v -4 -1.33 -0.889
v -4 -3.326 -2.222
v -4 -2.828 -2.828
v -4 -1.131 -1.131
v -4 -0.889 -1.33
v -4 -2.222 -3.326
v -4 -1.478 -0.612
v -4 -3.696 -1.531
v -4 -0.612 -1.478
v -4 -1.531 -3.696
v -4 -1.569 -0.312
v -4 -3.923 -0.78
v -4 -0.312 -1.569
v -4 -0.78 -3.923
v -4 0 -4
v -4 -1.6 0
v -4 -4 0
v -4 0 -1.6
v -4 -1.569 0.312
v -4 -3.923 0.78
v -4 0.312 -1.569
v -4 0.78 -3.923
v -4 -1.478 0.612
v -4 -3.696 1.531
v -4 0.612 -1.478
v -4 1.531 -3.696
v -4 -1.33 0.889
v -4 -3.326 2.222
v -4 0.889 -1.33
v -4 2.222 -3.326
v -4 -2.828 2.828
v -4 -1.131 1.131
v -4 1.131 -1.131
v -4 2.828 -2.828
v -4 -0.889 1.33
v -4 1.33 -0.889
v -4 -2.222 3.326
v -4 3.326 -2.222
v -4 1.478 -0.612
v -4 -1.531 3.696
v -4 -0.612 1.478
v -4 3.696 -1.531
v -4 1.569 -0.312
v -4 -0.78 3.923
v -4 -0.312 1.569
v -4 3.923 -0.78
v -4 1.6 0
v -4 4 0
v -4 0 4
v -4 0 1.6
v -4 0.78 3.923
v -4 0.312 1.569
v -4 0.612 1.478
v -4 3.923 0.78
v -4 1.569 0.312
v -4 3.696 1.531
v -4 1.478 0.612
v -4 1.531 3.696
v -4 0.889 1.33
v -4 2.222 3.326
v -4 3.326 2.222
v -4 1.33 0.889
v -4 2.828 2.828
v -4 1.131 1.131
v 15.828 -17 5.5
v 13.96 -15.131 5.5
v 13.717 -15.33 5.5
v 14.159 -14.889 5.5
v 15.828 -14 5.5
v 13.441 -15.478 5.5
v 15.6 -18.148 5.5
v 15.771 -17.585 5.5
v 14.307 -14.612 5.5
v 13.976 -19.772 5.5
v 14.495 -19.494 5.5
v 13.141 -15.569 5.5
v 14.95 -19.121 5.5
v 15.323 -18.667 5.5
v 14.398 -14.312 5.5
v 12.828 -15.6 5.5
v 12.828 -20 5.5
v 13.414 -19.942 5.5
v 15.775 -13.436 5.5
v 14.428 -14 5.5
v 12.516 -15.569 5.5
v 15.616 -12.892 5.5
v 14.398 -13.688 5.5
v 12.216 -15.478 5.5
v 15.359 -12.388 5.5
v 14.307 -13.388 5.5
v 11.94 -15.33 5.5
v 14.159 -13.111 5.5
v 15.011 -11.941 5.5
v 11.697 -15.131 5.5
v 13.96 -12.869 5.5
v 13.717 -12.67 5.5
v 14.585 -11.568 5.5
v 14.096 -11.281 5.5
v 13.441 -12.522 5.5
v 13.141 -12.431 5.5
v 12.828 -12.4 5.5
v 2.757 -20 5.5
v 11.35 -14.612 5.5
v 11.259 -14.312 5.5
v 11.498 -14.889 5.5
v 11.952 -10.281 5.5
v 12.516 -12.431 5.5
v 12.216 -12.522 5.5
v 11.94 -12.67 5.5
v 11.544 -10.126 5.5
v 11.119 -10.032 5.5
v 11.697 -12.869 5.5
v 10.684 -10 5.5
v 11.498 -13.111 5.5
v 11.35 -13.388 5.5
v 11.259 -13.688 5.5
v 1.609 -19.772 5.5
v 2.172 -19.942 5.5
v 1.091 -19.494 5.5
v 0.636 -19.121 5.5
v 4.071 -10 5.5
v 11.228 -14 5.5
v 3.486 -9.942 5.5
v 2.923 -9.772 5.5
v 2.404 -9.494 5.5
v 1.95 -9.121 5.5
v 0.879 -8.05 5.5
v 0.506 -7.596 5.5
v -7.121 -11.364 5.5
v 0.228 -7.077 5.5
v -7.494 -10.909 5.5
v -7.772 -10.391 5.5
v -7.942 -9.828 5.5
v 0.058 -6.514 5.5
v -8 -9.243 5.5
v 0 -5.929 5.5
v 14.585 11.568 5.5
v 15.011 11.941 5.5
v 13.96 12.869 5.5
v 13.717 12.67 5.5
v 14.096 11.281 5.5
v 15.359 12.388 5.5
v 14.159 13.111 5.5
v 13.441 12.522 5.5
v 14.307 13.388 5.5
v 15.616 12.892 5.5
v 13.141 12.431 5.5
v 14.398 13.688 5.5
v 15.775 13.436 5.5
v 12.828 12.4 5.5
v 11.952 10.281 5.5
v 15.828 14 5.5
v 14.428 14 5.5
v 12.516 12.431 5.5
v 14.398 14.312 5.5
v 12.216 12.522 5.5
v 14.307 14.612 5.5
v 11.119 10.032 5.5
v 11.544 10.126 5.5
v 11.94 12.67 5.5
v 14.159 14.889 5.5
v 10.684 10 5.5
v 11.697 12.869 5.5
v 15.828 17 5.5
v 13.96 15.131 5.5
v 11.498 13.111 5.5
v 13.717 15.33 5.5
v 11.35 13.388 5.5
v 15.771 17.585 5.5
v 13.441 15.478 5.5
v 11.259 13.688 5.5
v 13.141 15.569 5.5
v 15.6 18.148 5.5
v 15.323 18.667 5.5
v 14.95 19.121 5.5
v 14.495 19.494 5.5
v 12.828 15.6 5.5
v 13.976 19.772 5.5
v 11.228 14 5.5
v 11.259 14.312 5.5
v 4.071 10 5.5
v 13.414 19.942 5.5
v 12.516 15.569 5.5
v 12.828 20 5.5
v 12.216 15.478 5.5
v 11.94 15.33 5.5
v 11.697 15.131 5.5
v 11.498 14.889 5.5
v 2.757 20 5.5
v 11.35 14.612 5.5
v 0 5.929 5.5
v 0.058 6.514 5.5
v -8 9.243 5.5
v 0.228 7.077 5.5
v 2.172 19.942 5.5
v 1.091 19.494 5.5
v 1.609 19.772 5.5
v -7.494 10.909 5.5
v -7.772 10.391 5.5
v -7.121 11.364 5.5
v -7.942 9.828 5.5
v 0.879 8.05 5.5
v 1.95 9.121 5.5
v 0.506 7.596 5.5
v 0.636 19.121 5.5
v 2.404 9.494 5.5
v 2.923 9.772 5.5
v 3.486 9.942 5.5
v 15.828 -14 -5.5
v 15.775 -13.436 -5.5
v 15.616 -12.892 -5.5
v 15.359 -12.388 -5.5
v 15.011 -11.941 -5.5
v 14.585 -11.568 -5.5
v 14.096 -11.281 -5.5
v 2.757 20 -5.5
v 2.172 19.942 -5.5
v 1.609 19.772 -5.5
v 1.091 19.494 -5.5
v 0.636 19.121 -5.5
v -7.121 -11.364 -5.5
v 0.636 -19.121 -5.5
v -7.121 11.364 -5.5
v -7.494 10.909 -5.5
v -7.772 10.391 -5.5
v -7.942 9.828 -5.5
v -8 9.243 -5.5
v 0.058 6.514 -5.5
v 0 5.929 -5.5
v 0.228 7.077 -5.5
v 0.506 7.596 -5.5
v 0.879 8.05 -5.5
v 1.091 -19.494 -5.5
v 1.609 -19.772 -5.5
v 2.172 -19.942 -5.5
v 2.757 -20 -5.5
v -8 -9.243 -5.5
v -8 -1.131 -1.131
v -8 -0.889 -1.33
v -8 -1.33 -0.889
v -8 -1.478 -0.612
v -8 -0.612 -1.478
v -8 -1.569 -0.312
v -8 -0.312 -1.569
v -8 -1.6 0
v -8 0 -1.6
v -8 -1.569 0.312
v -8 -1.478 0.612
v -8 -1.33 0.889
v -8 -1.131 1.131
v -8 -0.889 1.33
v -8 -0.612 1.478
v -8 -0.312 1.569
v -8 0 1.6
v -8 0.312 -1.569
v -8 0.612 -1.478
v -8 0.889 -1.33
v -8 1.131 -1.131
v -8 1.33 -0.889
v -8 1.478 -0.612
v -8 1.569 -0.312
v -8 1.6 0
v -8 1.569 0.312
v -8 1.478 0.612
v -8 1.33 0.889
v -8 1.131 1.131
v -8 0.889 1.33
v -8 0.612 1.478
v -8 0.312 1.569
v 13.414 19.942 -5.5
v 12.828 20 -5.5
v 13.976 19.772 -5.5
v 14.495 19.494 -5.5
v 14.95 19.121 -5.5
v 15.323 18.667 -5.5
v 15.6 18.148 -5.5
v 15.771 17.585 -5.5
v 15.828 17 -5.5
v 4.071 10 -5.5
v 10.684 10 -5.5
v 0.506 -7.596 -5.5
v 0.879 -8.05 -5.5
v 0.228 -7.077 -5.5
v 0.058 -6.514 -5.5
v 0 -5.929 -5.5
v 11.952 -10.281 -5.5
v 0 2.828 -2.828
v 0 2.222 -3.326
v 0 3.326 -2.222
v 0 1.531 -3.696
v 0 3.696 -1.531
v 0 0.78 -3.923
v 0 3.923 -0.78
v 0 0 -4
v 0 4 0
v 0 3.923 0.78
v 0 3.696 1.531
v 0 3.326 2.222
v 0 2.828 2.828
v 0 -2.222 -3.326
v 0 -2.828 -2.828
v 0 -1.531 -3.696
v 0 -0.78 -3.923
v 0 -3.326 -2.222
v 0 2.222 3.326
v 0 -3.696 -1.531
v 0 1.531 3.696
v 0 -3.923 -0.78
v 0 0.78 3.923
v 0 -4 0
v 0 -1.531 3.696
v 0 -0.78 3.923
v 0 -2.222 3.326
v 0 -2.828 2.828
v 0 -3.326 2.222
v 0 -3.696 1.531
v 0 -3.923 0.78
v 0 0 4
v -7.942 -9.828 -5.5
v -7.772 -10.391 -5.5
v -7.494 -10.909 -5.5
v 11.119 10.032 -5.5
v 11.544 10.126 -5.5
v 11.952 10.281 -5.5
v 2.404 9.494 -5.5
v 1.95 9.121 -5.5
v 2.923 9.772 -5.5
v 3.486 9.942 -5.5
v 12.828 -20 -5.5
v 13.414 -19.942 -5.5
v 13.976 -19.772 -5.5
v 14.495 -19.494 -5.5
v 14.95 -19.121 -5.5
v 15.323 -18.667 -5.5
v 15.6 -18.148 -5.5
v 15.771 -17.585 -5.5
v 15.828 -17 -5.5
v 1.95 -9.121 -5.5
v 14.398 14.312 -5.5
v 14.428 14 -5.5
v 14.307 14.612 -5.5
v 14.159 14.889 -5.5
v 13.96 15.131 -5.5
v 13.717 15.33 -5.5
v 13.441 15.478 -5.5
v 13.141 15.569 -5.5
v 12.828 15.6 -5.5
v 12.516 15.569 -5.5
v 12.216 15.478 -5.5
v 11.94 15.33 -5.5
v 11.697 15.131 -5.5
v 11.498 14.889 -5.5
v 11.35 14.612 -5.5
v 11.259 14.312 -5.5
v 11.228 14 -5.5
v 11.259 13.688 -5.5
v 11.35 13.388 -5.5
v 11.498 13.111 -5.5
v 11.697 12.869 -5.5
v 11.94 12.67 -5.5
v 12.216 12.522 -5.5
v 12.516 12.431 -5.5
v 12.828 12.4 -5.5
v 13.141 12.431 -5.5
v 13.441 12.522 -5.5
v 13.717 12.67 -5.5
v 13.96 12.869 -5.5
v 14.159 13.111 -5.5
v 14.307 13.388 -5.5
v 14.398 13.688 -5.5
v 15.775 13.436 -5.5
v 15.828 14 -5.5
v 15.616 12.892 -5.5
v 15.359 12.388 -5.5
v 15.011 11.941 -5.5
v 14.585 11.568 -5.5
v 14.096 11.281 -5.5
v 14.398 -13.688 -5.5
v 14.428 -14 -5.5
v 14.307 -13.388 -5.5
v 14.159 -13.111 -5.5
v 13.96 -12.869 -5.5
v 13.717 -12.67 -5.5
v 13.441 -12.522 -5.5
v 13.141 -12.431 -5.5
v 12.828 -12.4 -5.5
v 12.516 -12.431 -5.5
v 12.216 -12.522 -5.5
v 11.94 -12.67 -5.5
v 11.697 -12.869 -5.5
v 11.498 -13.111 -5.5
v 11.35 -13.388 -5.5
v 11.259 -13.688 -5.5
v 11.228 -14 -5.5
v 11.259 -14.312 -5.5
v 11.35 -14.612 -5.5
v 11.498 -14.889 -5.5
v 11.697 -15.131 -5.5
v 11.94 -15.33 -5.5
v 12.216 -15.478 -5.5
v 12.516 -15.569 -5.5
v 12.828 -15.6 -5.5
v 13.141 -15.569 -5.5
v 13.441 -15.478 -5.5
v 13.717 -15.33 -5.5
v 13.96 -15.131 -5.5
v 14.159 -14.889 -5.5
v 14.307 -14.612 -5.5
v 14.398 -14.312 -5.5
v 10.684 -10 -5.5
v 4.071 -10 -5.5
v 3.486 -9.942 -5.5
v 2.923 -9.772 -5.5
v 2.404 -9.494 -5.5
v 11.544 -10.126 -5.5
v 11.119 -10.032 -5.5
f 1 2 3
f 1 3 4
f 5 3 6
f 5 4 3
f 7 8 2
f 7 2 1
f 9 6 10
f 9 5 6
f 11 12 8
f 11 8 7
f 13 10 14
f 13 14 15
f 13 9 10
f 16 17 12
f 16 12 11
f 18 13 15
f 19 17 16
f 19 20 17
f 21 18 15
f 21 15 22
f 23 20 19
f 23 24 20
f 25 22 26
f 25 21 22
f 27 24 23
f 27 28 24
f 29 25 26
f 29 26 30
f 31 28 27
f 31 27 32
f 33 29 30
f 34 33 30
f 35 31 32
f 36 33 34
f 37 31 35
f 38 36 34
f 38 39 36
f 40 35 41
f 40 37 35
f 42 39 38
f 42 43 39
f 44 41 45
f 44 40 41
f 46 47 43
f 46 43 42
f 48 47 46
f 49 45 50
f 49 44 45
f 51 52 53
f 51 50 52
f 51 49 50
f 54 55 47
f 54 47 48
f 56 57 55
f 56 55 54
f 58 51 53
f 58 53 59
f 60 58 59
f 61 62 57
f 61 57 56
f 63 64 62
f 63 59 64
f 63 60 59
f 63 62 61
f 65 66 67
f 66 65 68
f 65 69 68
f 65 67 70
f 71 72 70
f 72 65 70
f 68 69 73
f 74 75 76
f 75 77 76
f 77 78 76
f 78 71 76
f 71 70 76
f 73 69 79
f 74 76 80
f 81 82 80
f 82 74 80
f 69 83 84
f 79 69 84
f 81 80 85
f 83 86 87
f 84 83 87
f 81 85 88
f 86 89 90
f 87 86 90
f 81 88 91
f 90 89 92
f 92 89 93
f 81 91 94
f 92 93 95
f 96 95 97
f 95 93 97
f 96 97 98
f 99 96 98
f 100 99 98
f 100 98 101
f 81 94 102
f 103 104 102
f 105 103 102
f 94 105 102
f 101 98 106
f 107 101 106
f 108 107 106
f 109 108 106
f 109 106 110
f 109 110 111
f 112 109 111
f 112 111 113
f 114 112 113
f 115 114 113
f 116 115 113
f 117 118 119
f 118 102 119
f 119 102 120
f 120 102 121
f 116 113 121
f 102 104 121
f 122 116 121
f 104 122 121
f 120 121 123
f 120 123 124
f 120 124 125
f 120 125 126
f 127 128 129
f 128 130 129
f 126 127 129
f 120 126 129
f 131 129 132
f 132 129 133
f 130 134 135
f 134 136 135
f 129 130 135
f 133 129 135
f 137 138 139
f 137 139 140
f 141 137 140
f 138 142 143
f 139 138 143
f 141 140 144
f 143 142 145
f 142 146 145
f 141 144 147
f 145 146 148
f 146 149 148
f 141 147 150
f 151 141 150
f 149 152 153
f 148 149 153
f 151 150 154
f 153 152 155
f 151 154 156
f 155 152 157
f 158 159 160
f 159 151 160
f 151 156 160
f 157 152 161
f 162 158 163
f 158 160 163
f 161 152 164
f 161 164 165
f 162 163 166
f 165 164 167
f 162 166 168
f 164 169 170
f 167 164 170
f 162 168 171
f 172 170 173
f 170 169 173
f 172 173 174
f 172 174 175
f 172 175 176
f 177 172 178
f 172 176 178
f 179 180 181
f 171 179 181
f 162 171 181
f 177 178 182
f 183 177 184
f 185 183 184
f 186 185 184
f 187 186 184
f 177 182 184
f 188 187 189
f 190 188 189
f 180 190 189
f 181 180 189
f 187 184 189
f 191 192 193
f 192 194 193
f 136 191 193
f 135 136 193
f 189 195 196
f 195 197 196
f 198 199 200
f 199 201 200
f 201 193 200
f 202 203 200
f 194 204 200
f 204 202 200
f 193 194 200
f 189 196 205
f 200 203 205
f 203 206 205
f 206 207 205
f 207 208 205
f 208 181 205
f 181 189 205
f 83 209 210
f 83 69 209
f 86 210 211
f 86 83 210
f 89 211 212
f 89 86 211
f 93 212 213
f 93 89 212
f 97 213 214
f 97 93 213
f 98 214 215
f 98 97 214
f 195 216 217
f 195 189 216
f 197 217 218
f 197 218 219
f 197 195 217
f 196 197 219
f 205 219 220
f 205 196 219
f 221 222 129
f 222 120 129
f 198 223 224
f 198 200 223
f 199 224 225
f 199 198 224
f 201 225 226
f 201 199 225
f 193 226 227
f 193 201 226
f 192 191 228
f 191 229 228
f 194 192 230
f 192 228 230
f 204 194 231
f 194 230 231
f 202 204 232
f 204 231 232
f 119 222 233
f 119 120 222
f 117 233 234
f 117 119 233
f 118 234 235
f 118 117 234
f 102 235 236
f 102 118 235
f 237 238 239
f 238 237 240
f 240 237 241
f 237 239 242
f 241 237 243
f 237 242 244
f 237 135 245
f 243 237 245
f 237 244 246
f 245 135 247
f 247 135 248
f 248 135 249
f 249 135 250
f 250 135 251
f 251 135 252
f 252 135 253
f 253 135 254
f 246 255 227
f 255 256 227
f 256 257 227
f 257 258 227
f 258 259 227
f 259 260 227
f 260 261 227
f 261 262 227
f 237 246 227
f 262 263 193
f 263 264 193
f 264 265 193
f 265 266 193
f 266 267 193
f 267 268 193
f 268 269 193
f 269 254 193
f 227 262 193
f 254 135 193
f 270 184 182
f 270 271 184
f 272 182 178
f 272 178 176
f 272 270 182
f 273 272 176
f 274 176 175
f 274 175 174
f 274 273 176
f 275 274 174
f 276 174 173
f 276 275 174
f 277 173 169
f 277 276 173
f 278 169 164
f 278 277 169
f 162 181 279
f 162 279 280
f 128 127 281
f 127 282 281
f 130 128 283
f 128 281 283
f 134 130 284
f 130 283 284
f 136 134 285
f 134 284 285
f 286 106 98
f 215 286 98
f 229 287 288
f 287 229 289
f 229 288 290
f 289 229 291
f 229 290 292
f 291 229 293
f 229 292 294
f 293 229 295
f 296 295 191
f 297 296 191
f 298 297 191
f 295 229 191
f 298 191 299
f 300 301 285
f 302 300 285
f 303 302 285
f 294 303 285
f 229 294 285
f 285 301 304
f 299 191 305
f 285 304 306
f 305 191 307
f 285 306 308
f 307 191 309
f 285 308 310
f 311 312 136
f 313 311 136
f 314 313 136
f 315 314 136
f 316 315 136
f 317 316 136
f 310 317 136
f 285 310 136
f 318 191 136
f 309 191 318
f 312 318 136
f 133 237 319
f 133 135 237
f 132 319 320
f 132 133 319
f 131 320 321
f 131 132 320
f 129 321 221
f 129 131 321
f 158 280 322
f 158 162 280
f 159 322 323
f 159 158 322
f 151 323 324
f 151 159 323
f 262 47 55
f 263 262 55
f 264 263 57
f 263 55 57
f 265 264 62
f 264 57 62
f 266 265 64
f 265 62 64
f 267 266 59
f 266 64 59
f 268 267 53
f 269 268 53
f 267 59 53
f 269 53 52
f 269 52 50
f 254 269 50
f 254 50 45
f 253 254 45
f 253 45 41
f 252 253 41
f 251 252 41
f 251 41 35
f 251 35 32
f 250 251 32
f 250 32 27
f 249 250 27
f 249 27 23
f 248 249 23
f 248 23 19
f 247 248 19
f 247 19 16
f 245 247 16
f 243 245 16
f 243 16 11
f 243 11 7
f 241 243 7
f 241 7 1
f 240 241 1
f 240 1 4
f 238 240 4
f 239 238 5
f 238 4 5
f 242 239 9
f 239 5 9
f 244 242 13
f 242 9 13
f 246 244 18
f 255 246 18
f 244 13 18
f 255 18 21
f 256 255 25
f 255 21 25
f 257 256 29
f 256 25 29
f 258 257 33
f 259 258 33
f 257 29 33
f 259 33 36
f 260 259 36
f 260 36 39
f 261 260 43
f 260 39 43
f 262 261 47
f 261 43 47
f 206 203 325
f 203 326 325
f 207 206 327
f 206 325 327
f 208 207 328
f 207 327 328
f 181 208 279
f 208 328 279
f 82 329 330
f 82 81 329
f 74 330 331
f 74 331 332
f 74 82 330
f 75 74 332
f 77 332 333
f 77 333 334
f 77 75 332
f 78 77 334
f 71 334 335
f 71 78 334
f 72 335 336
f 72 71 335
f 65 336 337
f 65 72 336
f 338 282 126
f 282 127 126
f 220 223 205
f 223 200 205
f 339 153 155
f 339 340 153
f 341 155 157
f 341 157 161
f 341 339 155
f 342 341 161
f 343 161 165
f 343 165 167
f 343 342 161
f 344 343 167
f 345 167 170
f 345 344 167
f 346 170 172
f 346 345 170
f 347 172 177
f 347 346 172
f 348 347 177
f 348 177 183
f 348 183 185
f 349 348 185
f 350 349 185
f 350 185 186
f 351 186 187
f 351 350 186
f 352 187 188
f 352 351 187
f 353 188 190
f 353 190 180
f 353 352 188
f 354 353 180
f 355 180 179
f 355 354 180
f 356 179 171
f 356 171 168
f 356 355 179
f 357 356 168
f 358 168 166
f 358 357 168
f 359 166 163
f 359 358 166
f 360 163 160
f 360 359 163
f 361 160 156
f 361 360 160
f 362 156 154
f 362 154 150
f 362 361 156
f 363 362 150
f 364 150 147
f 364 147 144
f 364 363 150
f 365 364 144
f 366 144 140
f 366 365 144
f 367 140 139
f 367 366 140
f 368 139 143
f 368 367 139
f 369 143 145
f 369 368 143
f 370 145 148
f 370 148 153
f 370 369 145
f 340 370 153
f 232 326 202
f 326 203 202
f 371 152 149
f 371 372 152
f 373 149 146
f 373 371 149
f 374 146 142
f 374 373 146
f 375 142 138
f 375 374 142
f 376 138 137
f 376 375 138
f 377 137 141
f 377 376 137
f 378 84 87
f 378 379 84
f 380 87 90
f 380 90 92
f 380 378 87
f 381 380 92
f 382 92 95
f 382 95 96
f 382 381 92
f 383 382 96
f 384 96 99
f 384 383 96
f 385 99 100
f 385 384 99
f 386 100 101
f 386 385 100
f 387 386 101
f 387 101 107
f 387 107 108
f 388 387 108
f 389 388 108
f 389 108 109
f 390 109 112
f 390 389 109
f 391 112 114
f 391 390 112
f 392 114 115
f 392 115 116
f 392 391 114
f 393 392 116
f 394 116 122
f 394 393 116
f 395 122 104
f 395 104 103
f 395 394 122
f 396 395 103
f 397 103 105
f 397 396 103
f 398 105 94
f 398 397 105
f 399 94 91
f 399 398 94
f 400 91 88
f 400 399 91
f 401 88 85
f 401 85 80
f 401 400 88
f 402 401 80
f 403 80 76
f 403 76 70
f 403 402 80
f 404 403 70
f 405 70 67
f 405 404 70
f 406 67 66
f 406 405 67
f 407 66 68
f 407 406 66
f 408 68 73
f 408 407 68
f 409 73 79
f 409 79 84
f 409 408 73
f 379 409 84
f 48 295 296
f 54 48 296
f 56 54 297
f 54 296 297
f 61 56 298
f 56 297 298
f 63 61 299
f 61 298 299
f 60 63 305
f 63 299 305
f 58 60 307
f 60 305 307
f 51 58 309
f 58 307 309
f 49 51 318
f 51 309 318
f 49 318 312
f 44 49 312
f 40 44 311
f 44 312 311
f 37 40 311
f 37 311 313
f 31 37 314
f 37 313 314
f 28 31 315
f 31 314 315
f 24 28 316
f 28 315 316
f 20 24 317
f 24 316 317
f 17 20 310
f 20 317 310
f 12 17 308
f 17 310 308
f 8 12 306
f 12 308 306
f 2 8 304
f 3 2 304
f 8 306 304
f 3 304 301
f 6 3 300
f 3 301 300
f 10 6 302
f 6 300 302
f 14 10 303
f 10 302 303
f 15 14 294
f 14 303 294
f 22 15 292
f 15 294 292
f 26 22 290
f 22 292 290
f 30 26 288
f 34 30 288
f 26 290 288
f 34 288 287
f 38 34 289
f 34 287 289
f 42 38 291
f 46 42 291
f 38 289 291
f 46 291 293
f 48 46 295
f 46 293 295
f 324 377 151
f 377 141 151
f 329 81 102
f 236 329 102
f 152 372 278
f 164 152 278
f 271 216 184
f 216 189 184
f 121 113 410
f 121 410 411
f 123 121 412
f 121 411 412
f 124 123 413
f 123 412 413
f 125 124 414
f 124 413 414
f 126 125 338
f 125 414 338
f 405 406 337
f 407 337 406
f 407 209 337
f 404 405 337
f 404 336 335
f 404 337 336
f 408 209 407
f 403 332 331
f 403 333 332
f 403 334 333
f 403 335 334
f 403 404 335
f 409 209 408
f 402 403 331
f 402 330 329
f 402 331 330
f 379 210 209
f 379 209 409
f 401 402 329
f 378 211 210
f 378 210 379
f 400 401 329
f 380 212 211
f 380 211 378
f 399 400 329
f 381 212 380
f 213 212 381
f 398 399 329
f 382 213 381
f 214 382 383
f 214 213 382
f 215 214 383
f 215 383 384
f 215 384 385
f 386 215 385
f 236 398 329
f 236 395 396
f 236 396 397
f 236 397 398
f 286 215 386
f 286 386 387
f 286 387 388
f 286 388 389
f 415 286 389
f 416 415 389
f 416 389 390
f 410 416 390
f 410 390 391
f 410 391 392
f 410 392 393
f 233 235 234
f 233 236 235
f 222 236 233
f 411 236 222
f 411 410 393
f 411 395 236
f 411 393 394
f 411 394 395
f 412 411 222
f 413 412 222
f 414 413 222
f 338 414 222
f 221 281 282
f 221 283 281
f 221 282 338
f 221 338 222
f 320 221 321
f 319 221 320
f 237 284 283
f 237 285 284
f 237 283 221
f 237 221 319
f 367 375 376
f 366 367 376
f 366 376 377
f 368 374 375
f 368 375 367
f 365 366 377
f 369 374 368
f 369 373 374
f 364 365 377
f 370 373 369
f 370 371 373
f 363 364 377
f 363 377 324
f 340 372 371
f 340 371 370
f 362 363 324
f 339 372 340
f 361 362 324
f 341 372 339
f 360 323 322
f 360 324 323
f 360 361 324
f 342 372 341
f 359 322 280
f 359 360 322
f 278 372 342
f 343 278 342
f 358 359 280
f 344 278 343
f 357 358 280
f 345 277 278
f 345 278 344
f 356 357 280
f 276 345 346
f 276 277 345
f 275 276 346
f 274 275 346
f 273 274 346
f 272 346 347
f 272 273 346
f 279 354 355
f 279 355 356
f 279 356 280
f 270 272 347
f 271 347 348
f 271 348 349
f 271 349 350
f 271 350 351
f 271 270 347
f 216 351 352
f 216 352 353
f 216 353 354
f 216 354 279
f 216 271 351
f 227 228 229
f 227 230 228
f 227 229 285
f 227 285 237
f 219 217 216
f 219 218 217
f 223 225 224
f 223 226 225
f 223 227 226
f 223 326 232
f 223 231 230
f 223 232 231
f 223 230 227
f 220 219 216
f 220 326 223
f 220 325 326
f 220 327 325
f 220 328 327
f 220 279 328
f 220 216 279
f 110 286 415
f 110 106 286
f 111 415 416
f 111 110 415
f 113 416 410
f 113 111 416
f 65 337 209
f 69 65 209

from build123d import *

# Parameters (mm, degrees)
SKETCH_R             = 1.6
PAD_DEPTH            = 5.5
SKETCH001_R          = 1.6
POCKET_DEPTH         = 8.001
POCKET001_DEPTH      = 5.501
POCKET001_DEPTH_BACK = 5.501
SKETCH003_W          = 10
SKETCH003_H          = 45
POCKET002_DEPTH      = 5.501
POCKET002_DEPTH_BACK = 5.501
SKETCH004_R          = 4
POCKET003_DEPTH      = 4
FILLET_R             = 3


with BuildPart() as part:
    # Sketch → Pad (new body, symmetric)
    with BuildSketch(Plane.XY):
        Polygon((1.514719, 20), (18.828427, 20), (18.828427, 10), (6.828427, 10), (2.828427, 10), (0, 7.171573), (0, -7.171573), (2.828427, -10), (6.828427, -10), (18.828427, -10), (18.828427, -20), (1.514719, -20), (-8, -10.485281), (-8, 10.485281), align=None)
        with Locations((12.828427, 14)):
            Circle(SKETCH_R, mode=Mode.SUBTRACT)
        with Locations((12.828427, -14)):
            Circle(SKETCH_R, mode=Mode.SUBTRACT)
    extrude(amount=PAD_DEPTH, both=True)

    # Sketch001 → Pocket (cut, through all)
    with BuildSketch(Plane.YZ):
        Circle(SKETCH001_R)
    extrude(amount=-POCKET_DEPTH, mode=Mode.SUBTRACT)

    # Sketch002 → Pocket001 (cut, two sides)
    with BuildSketch(Plane.XY) as pocket001_sk:
        Polygon((18.828427, 13.487712), (11.349004, 10), (18.828427, 10), align=None)
        Polygon((11.349004, -10), (18.828427, -13.487712), (18.828427, -10), align=None)
    extrude(amount=-POCKET001_DEPTH, mode=Mode.SUBTRACT)
    extrude(pocket001_sk.sketch, amount=POCKET001_DEPTH_BACK, mode=Mode.SUBTRACT)

    # Sketch003 → Pocket002 (cut, two sides)
    with BuildSketch(Plane.XY) as pocket002_sk:
        with Locations((20.828427, 0)):
            Rectangle(SKETCH003_W, SKETCH003_H)
    extrude(amount=-POCKET002_DEPTH, mode=Mode.SUBTRACT)
    extrude(pocket002_sk.sketch, amount=POCKET002_DEPTH_BACK, mode=Mode.SUBTRACT)

    # Sketch004 → Pocket003 (cut)
    with BuildSketch(Plane.YZ):
        Circle(SKETCH004_R)
    extrude(amount=-POCKET003_DEPTH, mode=Mode.SUBTRACT)

    # Fillet
    fillet_edges = [part.edges().sort_by_distance(p)[0] for p in [
        (15.828427, -20, 0),
        (15.828427, -12.088789, 0),
        (11.349004, -10, 0),
        (2.828427, -10, 0),
        (0, -7.171573, 0),
        (0, 7.171573, 0),
        (2.828427, 10, 0),
        (11.349004, 10, 0),
        (15.828427, 12.088789, 0),
        (15.828427, 20, 0),
        (1.514719, 20, 0),
        (-8, 10.485281, 0),
        (-8, -10.485281, 0),
        (1.514719, -20, 0),
    ]]
    fillet(fillet_edges, radius=FILLET_R)


solid = part.part
